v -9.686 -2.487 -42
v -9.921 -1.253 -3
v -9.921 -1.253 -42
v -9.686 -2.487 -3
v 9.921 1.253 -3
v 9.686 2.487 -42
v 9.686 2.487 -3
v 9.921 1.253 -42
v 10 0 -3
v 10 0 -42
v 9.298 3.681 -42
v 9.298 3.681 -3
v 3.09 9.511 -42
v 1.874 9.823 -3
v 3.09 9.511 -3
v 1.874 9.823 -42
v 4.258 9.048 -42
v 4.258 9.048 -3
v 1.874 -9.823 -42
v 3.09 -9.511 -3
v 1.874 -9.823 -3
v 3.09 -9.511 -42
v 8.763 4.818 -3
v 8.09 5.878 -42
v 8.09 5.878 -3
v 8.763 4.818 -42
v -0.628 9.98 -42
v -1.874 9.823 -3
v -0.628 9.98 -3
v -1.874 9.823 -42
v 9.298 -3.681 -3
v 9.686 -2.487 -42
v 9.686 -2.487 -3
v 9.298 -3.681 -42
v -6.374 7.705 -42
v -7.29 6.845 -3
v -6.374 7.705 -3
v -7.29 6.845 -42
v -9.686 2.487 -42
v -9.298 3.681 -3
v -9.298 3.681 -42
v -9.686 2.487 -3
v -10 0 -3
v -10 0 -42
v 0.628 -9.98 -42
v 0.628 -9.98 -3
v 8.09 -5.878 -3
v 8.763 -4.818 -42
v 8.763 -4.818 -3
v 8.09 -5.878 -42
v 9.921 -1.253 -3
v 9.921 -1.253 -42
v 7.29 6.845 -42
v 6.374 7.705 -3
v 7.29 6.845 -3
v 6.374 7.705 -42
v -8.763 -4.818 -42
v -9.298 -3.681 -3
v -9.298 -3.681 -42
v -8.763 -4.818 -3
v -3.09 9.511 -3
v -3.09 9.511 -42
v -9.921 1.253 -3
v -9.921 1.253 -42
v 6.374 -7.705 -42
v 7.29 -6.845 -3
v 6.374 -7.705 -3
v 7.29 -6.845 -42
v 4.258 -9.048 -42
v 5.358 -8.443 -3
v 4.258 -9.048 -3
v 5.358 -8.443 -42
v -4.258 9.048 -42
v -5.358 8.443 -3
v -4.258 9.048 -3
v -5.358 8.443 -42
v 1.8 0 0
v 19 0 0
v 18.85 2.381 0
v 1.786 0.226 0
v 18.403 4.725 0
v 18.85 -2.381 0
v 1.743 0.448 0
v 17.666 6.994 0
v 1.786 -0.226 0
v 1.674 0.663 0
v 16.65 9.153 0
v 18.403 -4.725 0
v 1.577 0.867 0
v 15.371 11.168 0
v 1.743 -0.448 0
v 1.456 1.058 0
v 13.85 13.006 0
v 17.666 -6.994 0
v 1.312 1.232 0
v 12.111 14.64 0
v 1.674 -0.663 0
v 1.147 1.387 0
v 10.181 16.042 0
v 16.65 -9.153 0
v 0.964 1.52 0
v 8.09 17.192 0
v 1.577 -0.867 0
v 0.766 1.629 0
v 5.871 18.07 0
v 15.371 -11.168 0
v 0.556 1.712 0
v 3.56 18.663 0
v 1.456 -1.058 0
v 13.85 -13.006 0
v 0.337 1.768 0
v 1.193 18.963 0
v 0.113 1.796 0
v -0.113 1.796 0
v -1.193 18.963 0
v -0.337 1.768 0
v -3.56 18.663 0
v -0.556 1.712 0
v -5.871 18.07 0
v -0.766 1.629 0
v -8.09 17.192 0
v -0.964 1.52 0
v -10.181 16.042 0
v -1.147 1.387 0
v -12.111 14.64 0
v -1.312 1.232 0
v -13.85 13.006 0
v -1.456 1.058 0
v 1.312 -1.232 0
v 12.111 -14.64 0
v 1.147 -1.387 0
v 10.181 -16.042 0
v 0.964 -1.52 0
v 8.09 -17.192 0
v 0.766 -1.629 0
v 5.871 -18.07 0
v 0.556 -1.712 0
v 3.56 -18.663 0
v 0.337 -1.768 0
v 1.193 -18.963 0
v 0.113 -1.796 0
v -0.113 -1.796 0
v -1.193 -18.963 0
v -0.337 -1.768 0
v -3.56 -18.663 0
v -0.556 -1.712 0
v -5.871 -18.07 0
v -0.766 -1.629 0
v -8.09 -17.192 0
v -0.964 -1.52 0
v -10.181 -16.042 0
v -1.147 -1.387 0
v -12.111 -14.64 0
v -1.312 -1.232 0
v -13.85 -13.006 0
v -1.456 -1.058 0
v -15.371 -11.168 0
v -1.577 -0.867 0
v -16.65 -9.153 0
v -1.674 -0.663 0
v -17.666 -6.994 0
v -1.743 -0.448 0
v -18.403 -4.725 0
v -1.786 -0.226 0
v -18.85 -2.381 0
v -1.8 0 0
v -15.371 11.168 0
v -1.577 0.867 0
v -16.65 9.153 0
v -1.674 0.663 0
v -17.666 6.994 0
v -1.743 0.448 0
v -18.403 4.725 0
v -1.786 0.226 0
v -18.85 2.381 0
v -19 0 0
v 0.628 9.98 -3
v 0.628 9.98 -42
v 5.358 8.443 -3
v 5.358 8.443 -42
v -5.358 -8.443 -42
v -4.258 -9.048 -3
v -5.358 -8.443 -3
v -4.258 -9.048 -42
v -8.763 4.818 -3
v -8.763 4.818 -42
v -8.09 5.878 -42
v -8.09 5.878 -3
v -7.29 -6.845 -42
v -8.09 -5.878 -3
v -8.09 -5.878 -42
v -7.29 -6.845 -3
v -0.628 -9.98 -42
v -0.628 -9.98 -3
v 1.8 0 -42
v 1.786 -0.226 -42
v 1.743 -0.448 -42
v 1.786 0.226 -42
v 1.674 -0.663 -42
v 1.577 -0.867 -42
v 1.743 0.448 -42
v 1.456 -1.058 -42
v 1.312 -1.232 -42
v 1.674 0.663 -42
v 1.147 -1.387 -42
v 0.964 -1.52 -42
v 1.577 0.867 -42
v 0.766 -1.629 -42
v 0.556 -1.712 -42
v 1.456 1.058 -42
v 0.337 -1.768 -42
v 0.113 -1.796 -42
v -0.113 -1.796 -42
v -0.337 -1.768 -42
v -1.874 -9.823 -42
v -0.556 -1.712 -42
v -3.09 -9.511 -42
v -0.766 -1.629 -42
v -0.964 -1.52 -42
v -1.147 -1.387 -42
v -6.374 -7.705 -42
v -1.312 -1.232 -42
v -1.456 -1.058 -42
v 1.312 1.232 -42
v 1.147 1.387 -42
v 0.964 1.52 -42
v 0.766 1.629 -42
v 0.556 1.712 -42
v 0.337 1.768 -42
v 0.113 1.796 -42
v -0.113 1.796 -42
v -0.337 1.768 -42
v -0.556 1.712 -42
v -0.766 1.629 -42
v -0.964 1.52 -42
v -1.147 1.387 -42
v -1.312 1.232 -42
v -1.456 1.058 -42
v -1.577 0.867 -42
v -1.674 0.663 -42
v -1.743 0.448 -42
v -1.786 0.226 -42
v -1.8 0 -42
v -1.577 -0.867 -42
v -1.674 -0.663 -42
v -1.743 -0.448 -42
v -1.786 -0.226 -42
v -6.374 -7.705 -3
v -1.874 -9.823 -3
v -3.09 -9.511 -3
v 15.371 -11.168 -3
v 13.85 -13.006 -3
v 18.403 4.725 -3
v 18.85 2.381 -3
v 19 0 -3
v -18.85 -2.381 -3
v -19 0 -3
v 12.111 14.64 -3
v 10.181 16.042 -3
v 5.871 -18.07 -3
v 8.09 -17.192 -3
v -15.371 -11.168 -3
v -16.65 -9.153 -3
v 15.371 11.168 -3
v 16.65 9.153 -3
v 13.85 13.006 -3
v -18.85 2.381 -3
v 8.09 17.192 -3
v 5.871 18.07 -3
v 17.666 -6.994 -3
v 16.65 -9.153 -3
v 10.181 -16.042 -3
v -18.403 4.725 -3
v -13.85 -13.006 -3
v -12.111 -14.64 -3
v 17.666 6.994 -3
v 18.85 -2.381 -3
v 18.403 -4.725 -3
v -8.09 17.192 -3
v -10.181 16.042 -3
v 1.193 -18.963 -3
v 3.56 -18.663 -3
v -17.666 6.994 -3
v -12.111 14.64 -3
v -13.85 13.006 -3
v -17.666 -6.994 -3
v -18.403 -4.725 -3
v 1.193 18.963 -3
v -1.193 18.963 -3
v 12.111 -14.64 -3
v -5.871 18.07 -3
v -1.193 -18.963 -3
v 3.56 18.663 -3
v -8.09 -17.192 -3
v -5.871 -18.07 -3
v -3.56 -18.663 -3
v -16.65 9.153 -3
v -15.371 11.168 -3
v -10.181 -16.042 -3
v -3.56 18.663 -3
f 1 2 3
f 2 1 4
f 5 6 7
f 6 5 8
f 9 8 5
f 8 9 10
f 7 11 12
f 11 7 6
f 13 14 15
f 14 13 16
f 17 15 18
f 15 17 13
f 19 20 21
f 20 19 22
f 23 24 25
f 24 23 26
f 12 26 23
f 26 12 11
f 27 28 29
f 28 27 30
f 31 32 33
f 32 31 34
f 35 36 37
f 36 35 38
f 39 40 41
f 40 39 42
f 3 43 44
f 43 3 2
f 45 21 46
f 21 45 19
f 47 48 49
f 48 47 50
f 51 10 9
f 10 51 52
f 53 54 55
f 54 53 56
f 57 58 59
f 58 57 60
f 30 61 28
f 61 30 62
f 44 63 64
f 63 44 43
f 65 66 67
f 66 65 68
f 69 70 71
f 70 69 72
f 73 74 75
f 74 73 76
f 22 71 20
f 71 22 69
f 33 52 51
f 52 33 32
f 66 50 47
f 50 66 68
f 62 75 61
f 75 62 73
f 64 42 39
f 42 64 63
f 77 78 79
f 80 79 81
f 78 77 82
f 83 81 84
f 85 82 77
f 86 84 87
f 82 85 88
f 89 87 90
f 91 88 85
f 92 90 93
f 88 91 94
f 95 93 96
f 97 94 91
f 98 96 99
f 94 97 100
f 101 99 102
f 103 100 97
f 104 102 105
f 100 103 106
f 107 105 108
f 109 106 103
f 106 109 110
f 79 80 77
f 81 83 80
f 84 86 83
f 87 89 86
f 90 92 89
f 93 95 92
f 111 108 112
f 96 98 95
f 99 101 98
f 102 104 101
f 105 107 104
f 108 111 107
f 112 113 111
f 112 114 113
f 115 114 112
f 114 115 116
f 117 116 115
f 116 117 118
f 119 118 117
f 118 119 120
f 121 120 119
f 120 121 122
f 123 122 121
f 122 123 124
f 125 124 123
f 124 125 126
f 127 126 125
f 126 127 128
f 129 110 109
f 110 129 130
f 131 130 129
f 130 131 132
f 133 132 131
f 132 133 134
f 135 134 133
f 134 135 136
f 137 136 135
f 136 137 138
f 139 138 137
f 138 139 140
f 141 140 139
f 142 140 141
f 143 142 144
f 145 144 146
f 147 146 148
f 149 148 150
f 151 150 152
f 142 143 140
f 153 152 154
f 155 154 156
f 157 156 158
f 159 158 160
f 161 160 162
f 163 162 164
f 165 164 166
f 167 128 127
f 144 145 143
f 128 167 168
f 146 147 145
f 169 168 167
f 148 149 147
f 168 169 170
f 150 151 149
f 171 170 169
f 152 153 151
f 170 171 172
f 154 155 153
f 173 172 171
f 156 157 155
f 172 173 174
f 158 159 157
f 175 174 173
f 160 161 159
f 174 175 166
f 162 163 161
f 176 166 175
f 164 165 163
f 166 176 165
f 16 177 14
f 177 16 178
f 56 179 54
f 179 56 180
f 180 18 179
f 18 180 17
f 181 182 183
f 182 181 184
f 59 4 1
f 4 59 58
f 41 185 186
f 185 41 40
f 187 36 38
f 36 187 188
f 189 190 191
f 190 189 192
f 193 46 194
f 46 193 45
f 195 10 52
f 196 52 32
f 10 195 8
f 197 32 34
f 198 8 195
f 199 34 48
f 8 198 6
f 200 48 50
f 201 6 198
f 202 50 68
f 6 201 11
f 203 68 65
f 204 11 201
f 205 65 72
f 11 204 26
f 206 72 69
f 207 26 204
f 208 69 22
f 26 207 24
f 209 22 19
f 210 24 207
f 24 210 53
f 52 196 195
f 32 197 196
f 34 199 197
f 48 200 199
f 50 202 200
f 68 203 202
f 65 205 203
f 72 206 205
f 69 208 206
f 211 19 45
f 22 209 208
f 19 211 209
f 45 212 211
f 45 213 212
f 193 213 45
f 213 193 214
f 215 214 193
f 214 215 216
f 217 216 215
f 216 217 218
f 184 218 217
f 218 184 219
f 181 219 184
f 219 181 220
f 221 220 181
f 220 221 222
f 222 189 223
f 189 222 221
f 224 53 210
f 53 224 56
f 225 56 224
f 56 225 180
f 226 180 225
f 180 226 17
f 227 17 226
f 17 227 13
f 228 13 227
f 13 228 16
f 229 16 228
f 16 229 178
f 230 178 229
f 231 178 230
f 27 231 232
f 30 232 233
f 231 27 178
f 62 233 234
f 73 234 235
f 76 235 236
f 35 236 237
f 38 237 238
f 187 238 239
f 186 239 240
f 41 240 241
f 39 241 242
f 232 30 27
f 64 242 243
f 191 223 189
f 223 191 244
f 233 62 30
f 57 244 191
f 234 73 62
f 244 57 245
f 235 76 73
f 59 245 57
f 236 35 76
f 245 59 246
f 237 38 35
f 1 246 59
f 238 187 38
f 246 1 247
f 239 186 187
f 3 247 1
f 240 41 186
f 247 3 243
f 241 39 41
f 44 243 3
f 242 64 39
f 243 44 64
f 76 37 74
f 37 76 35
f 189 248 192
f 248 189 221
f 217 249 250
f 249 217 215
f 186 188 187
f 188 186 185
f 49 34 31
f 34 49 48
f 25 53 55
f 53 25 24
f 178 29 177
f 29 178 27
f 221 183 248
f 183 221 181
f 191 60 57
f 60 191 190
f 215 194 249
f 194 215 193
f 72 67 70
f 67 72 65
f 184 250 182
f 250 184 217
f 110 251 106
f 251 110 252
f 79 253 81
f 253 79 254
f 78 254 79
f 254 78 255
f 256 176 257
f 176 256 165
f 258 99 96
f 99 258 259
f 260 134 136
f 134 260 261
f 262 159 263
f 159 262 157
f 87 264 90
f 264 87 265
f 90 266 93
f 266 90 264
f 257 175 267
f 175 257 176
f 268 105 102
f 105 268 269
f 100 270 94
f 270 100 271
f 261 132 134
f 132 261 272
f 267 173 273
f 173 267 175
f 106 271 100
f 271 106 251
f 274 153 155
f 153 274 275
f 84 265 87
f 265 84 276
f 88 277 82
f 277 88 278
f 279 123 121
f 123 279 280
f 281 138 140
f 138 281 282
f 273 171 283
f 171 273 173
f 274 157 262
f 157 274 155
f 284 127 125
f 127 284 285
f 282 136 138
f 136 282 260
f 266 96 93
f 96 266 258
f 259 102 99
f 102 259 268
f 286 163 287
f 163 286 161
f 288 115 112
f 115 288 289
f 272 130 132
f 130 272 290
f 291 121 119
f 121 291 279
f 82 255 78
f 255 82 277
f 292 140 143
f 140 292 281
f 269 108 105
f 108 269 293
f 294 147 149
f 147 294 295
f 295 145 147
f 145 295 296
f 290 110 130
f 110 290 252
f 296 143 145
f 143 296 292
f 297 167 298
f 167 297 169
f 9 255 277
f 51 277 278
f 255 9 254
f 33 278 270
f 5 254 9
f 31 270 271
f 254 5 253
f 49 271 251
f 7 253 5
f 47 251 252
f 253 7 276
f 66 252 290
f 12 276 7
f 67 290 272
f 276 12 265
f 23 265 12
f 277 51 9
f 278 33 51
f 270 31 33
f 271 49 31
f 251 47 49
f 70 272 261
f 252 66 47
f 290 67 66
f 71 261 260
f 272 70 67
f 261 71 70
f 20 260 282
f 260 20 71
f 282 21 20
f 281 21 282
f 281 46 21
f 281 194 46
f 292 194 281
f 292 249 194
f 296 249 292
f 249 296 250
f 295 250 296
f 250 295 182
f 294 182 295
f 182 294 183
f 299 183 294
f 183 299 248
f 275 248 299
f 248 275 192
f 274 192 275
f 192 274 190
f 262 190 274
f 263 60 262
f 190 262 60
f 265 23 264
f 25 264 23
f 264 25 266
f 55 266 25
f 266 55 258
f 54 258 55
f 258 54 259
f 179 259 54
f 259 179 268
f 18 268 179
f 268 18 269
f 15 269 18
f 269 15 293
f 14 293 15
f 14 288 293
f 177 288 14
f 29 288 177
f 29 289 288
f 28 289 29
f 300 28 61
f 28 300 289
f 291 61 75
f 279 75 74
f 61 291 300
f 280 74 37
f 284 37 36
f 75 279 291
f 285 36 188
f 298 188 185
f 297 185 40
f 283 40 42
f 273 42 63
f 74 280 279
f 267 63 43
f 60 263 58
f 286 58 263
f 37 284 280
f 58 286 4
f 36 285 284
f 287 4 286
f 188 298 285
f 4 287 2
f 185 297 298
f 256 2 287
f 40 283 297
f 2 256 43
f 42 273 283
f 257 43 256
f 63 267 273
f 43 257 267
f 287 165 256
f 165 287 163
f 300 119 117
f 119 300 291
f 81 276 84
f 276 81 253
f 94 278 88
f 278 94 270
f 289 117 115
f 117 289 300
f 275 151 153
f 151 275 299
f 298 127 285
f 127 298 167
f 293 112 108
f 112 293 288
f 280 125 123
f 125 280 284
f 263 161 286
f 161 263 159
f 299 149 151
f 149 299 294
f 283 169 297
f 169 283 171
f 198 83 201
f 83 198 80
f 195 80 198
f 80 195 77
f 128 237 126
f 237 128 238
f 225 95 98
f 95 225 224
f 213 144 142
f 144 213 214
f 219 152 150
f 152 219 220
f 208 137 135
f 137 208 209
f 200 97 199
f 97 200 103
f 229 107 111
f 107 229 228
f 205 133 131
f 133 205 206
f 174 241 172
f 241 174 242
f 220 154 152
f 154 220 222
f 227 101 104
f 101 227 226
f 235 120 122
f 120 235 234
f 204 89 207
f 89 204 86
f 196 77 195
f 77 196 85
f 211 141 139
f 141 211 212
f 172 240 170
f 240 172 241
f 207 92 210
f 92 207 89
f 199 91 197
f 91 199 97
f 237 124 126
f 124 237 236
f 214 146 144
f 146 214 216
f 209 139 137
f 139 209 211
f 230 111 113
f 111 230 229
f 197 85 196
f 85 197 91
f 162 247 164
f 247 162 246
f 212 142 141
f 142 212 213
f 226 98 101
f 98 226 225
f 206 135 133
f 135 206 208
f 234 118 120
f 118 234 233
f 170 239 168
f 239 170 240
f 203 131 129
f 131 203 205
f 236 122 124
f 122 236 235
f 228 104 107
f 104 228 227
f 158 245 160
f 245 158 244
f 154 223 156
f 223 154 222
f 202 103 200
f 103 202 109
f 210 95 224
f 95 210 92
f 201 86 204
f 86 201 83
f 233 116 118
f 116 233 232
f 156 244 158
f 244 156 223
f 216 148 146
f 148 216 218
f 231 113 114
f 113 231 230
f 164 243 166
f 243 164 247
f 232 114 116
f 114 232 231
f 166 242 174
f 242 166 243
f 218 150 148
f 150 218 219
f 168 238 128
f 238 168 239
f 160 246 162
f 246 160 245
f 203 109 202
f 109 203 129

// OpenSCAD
$fn = 50;


difference() {
	union() {
		translate(v = [0, 0, -42.0000000000]) {
			cylinder(h = 42, r = 10.0000000000);
		}
		translate(v = [0, 0, -3.0000000000]) {
			cylinder(h = 3, r = 19.0000000000);
		}
	}
	union() {
		#translate(v = [0, 0, -42]) {
			cylinder(h = 42, r = 1.8000000000);
		}
	}
}
